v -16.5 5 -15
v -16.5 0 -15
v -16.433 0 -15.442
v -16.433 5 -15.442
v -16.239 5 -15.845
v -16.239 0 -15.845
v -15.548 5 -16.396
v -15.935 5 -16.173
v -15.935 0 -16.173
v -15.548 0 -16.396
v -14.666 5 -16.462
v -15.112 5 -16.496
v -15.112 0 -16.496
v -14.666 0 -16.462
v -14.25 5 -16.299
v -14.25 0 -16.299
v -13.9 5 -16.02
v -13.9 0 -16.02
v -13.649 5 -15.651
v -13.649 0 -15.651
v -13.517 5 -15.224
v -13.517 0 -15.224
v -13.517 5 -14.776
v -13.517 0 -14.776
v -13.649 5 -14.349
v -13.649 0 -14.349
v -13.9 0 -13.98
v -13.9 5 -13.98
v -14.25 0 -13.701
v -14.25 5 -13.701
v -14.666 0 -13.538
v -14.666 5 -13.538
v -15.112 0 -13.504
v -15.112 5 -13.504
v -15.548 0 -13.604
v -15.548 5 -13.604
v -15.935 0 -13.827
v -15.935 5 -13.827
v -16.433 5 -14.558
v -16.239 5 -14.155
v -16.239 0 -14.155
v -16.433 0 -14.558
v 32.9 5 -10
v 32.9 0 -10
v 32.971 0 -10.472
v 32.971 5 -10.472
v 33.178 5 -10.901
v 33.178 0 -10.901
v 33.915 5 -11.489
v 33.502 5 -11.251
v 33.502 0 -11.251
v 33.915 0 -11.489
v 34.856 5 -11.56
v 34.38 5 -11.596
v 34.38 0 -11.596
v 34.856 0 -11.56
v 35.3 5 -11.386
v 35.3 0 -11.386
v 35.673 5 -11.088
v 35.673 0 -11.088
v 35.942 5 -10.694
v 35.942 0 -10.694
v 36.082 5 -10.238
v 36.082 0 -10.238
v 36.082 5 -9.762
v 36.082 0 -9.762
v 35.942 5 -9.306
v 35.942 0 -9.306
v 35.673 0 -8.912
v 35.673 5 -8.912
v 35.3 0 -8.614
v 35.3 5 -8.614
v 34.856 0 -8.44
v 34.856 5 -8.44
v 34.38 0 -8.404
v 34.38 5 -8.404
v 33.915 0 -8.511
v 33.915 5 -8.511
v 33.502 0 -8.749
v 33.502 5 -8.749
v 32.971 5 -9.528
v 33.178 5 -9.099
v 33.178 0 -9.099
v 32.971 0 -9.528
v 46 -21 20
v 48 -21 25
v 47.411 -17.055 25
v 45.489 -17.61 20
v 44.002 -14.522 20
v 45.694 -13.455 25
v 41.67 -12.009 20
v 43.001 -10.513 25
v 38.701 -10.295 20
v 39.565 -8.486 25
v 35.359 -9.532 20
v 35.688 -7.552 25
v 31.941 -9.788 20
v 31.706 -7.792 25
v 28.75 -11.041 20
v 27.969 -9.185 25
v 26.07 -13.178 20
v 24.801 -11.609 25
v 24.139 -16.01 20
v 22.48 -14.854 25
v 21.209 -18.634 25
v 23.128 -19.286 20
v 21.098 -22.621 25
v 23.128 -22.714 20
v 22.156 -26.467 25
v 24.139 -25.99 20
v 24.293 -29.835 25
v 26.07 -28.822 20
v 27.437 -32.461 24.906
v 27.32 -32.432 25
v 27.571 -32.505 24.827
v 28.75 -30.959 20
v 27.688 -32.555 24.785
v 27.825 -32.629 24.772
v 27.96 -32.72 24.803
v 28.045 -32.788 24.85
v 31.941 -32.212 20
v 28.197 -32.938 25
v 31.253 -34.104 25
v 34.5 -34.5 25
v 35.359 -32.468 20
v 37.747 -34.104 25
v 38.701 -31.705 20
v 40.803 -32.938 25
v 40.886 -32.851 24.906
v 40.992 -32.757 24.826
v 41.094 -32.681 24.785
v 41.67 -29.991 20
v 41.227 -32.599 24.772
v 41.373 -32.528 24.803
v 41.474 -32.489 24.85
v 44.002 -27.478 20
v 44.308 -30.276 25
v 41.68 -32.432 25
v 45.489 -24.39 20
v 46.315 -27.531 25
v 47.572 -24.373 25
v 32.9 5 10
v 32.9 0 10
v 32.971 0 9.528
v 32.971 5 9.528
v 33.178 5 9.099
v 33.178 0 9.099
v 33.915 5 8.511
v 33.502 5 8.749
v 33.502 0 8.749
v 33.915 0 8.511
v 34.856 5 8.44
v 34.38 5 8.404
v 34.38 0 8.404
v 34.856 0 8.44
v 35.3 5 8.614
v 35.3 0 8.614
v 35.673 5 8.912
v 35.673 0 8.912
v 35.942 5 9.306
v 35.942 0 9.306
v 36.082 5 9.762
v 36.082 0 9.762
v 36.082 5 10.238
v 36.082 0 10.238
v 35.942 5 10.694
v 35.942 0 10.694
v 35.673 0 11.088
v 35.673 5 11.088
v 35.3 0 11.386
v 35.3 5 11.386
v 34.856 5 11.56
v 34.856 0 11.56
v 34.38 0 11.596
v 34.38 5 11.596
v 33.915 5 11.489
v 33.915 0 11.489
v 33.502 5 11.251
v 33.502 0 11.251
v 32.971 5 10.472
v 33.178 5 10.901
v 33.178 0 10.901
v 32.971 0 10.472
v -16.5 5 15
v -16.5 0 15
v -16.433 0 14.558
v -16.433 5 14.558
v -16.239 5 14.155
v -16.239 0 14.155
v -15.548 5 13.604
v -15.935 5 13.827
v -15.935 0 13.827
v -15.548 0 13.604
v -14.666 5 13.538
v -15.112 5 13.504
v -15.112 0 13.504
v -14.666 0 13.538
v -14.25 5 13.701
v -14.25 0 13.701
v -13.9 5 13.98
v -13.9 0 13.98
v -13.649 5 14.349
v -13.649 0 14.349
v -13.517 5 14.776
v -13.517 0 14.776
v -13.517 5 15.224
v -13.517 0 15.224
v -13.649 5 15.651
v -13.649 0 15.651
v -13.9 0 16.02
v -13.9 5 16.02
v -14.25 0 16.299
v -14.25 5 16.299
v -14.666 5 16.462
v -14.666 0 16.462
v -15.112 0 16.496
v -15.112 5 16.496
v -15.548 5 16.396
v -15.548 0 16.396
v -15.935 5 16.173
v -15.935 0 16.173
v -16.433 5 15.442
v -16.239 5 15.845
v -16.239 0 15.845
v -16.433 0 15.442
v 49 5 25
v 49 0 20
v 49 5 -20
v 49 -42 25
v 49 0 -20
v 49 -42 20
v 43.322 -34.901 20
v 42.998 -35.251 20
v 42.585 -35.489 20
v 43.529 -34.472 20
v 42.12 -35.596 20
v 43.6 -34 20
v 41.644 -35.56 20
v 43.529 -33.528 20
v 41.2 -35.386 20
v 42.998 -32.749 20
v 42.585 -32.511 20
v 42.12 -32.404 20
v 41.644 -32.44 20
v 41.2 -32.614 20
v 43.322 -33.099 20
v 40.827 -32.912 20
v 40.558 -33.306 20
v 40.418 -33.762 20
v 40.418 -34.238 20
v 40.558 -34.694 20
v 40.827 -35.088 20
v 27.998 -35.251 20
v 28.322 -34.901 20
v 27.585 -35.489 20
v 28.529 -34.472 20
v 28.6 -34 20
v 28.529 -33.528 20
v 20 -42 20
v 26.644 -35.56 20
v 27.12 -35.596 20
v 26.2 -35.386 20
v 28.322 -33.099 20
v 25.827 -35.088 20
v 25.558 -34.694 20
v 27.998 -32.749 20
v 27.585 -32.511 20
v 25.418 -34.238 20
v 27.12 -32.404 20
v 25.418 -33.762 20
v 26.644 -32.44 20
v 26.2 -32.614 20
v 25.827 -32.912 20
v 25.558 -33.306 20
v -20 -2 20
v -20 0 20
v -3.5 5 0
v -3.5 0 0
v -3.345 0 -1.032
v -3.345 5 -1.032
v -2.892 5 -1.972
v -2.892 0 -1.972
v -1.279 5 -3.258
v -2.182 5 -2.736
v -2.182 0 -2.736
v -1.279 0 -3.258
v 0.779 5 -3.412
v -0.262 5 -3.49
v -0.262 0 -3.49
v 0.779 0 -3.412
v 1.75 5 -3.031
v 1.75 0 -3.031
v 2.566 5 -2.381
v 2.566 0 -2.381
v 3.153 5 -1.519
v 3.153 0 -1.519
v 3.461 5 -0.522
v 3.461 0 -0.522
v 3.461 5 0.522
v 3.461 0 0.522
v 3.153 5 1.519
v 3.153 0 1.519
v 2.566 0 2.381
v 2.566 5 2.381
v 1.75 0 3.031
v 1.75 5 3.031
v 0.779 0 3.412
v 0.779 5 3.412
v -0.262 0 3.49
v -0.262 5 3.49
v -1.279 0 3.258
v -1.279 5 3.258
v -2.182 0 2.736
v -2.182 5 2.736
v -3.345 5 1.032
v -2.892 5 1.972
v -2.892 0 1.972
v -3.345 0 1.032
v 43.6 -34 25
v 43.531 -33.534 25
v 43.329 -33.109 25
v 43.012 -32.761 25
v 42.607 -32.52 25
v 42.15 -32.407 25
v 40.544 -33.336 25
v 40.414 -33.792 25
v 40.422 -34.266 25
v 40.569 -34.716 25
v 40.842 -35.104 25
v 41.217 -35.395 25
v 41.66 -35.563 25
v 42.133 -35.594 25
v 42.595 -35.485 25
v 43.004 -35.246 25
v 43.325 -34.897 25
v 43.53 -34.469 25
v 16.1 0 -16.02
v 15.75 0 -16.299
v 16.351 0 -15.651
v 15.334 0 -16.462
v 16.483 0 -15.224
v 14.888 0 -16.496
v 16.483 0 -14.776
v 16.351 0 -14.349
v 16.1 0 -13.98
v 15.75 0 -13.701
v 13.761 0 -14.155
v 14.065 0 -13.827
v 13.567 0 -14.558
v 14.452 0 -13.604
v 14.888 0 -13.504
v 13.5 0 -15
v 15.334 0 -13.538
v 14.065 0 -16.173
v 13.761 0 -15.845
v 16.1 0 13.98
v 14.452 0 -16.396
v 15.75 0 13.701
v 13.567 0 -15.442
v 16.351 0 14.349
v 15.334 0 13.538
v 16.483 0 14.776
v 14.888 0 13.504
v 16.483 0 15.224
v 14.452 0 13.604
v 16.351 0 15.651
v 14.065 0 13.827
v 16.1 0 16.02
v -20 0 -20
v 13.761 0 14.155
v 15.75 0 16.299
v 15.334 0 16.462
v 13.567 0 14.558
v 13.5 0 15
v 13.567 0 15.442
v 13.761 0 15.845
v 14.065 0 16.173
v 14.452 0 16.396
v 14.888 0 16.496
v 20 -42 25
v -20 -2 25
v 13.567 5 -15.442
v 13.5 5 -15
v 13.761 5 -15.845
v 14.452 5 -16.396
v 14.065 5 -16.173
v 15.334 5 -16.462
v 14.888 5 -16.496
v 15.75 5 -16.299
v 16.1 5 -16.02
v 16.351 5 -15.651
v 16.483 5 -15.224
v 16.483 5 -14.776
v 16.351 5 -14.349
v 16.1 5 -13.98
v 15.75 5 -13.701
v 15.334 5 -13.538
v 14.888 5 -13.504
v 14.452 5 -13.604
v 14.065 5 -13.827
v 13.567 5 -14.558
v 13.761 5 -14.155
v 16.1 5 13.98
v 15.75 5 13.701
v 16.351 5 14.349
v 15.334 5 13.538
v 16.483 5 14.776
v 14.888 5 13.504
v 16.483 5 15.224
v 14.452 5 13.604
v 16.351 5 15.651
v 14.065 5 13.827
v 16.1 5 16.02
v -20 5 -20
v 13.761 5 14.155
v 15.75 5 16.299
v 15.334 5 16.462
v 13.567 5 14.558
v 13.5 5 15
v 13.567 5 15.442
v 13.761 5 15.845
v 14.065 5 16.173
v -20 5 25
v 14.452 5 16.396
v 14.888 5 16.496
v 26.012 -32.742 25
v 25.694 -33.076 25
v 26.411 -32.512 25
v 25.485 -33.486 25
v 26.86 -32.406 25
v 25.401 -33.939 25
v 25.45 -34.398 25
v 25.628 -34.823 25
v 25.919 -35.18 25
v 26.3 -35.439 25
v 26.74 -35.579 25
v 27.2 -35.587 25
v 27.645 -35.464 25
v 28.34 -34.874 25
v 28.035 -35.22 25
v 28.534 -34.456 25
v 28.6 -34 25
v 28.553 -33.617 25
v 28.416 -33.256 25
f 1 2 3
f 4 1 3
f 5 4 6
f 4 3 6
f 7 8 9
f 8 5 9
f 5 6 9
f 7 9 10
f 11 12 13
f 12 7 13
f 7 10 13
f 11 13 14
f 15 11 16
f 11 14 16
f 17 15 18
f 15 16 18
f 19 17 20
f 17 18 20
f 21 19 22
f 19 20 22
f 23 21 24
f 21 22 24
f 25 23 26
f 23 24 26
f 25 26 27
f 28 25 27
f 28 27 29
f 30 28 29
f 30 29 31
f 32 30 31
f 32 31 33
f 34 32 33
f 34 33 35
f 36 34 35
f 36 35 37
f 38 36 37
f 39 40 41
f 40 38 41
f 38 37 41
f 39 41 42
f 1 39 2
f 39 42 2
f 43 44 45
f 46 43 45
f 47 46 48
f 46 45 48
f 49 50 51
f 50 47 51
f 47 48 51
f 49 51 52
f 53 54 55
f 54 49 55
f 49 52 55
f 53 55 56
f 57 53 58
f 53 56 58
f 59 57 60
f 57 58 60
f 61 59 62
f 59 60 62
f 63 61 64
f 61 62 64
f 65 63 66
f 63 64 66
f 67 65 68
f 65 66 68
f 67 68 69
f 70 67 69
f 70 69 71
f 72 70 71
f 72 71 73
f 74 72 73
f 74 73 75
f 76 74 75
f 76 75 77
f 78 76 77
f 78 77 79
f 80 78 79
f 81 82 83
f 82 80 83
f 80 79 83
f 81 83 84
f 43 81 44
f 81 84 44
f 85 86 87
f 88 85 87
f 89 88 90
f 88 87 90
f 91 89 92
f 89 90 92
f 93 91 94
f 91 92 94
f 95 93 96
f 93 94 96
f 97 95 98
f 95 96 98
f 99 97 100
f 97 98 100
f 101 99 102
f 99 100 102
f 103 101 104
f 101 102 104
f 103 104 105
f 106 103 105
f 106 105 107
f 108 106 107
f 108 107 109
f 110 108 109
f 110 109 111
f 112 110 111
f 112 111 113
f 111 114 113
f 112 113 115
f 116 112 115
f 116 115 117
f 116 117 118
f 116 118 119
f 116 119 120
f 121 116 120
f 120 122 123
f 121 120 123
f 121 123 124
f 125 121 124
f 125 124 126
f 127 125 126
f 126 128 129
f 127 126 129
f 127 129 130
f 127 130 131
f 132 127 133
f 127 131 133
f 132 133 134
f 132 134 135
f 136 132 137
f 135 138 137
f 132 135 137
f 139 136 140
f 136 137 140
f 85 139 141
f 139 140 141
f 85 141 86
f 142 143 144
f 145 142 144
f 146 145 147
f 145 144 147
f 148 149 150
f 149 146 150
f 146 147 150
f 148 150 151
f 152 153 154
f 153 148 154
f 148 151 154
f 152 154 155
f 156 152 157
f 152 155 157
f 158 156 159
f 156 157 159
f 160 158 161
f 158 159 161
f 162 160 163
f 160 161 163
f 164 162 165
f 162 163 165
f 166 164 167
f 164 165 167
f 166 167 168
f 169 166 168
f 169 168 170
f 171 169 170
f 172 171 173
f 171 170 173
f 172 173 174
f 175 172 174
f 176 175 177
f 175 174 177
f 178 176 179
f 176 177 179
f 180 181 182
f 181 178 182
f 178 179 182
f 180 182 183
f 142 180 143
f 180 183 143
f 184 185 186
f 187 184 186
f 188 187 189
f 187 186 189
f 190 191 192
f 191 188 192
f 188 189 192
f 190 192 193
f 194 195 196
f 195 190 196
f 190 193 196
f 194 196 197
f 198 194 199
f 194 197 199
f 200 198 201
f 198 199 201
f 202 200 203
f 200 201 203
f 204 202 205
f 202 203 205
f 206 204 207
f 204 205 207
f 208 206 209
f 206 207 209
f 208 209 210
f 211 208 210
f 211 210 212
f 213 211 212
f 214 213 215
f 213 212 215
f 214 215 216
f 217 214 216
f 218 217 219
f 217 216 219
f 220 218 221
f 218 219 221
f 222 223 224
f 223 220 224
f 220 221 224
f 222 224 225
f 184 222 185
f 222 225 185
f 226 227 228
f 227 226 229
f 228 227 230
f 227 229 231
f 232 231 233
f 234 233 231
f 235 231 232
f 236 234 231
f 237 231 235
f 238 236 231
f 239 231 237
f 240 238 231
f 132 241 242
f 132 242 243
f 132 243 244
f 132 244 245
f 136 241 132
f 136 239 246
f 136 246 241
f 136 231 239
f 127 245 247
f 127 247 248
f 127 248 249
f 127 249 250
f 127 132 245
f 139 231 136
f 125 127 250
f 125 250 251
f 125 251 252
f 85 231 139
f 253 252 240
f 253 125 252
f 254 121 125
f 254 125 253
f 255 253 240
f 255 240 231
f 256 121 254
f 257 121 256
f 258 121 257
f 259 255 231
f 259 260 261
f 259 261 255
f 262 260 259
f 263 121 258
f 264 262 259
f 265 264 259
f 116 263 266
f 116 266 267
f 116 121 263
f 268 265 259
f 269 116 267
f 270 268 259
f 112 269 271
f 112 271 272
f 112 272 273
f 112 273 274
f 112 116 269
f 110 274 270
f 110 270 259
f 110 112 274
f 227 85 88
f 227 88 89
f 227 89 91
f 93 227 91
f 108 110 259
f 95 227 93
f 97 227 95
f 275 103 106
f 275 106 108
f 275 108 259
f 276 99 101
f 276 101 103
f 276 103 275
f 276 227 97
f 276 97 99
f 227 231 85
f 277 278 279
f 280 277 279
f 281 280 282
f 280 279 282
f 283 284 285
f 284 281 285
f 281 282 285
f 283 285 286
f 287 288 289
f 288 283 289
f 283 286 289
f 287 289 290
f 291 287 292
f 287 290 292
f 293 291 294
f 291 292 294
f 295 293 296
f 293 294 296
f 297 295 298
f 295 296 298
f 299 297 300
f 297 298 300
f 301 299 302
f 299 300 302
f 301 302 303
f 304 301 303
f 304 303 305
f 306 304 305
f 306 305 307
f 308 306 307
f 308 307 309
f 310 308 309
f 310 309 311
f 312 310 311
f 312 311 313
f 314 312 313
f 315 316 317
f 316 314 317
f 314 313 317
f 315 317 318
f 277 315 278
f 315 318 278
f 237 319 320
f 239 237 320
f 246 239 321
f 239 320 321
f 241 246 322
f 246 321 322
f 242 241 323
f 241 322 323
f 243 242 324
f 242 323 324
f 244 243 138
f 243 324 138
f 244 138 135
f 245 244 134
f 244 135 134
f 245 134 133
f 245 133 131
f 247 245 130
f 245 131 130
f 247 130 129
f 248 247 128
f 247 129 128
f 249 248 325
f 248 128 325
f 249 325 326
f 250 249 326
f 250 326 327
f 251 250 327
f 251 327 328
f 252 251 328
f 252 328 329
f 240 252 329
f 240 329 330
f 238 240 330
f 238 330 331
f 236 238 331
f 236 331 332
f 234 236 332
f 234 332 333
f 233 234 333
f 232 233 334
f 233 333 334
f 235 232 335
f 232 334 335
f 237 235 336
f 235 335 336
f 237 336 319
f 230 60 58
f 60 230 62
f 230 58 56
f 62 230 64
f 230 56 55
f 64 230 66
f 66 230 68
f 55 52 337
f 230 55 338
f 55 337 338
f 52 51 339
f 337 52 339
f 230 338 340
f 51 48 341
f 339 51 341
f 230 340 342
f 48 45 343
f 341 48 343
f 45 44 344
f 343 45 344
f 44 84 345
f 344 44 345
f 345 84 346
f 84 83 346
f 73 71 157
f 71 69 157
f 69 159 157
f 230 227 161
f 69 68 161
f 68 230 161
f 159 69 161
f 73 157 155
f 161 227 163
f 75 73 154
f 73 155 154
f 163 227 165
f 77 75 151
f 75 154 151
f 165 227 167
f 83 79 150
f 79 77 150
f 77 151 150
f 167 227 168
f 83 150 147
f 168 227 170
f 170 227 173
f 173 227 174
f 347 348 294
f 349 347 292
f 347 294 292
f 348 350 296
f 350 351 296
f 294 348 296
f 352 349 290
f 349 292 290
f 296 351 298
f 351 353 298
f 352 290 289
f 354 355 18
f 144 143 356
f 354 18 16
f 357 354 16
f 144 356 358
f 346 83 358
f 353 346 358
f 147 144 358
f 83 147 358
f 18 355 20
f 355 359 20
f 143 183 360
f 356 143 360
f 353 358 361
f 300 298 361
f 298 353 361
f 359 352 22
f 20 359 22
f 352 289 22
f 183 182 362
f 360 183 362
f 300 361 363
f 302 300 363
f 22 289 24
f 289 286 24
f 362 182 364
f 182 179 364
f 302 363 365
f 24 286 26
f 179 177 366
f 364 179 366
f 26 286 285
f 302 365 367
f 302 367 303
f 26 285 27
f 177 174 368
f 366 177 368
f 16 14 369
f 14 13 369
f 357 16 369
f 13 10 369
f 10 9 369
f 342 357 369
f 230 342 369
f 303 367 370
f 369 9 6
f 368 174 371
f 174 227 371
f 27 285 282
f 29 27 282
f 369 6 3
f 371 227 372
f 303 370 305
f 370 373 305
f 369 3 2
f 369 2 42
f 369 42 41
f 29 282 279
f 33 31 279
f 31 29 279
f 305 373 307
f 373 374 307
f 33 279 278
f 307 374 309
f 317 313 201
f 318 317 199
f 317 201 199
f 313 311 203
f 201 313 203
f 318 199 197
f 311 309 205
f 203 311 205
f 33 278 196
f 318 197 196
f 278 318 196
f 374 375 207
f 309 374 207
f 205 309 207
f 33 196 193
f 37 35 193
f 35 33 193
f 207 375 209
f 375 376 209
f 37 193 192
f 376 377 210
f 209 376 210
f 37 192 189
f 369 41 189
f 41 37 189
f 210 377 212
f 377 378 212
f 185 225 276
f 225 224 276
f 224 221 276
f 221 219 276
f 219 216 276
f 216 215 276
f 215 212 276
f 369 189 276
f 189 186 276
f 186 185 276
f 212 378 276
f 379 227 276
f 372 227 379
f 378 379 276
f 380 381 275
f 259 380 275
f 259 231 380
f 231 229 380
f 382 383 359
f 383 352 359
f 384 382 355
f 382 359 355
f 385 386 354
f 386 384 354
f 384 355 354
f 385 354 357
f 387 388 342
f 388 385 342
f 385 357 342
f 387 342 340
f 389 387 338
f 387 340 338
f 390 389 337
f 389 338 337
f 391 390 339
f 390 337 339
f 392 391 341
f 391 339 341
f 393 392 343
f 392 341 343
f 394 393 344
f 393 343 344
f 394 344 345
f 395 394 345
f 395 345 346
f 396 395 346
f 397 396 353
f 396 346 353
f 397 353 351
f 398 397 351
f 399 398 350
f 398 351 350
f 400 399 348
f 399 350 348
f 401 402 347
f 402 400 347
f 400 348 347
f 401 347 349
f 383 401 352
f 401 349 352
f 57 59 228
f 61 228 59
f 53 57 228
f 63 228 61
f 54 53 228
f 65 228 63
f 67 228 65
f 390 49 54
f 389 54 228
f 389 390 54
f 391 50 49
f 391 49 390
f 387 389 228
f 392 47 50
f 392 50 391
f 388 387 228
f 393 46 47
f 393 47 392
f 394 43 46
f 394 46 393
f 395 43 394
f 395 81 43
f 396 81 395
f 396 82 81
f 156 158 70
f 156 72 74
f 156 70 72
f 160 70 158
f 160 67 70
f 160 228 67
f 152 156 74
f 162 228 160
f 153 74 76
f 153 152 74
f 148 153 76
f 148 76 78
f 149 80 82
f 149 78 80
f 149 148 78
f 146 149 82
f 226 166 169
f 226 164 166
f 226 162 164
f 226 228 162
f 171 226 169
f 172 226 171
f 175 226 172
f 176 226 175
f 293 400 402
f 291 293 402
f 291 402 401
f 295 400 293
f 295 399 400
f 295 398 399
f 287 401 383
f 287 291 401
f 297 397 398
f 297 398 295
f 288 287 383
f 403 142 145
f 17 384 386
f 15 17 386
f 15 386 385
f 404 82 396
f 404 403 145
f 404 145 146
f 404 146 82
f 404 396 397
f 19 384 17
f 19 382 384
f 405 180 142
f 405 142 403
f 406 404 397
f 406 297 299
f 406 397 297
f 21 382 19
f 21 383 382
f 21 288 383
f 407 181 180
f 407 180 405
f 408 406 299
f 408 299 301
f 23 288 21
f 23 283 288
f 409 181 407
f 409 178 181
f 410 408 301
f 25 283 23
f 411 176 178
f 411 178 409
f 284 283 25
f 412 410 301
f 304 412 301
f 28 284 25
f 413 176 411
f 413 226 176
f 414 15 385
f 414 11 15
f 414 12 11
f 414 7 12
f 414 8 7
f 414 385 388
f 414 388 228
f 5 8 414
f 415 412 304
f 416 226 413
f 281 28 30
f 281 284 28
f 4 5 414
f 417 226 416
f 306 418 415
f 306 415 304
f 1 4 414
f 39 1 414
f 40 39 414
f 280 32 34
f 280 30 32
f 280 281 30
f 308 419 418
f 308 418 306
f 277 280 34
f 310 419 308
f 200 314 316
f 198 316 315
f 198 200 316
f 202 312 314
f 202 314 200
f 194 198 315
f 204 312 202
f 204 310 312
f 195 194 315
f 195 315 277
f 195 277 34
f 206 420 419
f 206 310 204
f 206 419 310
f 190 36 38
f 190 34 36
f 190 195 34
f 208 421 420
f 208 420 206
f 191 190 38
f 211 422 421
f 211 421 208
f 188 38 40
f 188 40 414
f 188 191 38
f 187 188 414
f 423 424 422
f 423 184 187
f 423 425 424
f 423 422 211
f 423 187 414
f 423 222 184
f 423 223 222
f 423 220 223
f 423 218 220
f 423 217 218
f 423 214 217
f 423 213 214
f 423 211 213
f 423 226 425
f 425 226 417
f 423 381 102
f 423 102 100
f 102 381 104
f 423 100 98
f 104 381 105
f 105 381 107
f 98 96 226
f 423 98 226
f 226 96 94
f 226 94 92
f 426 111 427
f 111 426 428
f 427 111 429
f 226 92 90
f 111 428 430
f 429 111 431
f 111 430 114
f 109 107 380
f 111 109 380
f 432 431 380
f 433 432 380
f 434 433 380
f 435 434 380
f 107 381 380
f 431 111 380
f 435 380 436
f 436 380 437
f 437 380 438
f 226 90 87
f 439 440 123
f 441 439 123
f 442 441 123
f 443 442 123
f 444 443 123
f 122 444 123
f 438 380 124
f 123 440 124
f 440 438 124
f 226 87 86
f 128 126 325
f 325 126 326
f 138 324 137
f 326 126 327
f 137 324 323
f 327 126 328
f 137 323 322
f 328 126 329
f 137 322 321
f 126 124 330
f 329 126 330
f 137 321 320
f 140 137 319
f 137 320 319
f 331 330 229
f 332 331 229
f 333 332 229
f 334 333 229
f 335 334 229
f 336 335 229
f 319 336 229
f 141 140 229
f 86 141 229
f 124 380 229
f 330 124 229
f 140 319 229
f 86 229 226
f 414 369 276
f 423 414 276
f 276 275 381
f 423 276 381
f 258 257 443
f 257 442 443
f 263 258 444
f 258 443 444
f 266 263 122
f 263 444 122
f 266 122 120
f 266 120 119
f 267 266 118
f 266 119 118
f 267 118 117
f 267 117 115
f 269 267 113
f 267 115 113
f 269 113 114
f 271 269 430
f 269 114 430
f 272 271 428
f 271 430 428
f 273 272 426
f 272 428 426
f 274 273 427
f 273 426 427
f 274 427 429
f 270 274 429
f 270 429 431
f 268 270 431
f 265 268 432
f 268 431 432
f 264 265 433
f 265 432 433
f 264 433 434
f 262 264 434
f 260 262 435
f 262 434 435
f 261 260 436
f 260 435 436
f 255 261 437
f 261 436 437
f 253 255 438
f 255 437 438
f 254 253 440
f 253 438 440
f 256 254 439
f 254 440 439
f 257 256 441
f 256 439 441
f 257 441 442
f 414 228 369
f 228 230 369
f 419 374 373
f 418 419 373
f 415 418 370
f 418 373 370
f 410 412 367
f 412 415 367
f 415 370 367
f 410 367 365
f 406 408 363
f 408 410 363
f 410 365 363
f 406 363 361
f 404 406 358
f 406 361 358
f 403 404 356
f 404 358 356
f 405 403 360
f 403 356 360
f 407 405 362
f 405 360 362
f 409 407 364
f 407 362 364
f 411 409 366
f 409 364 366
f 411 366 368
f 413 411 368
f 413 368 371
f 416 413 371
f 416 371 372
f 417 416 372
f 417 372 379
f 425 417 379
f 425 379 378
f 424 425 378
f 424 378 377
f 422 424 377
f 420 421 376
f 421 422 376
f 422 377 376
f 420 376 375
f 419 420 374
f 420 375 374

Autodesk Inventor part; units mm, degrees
ref_plane "YZ Plane" through (0, 0, 0) normal (1, 0, 0) x (0, 1, 0)
ref_plane "XZ Plane" through (0, 0, 0) normal (0, 1, 0) x (-1, 0, 0)
ref_plane "XY Plane" through (0, 0, 0) normal (0, 0, 1) x (1, 0, 0)
sketch "Sketch1" plane through (0, 0, 0) normal (0, 1, 0) x (-1, 0, 0)
  line L0 (-20, 20) -> (20, 20)
  line L1 (20, 20) -> (20, -20)
  line L2 (20, -20) -> (-20, -20)
  line L3 (-20, -20) -> (-20, 20)
  line L4 (-20, 20) -> (20, -20) construction
  line L5 (20, 20) -> (-20, -20) construction
  circle A0 centre (15, -15) radius 1.5
  circle A1 centre (-15, -15) radius 1.5
  circle A2 centre (-15, 15) radius 1.5
  circle A3 centre (15, 15) radius 1.5
  line L6 (15, 15) -> (15, -15) construction
  line L7 (-15, -15) -> (15, -15) construction
  line L8 (-15, -15) -> (-15, 15) construction
  line L9 (-20, 20) -> (-49, 20)
  line L10 (-49, 20) -> (-49, -20)
  line L11 (-49, -20) -> (-20, -20)
  circle A4 centre (0, 0) radius 3.5
  line L12 (20, 20) -> (20, 25)
  line L13 (20, 25) -> (-49, 25)
  line L14 (-49, 25) -> (-49, 20)
  line L15 (-34.5, -20) -> (-34.5, -10) construction
  line L16 (-34.5, -10) -> (-34.5, 10) construction
  circle A5 centre (-34.5, -10) radius 1.6
  circle A6 centre (-34.5, 10) radius 1.6
  dimension "d0" = 40
  dimension "d1" = 40
  dimension "d2" = 30
  dimension "d3" = 3
  dimension "d26" = 7
  dimension "d27" = 29
  dimension "d29" = 5
  dimension "d40" = 10
  dimension "d41" = 20
  dimension "d42" = 3.2
sketch "Sketch1 outline for Extrusion1" plane through (0, 0, 0) normal (0, 1, 0) x (-1, 0, 0)
  line L0 (-49, 25) -> (-49, -20)
  line L1 (-49, -20) -> (20, -20)
  line L2 (20, -20) -> (20, 25)
  line L3 (20, 25) -> (-49, 25)
  circle A0 centre (15, 15) radius 1.5
  circle A1 centre (0, 0) radius 3.5
  circle A2 centre (-34.5, -10) radius 1.6
  circle A3 centre (-15, -15) radius 1.5
  circle A4 centre (15, -15) radius 1.5
  circle A5 centre (-34.5, 10) radius 1.6
  circle A6 centre (-15, 15) radius 1.5
extrude "Extrusion1" add sketch "Sketch1 outline for Extrusion1" along normal blind 5
sketch "Sketch1 outline for Extrusion4" plane through (0, 0, 0) normal (0, 1, 0) x (-1, 0, 0)
  line L0 (-49, 25) -> (-49, 20)
  line L1 (20, 25) -> (-49, 25)
  line L2 (20, 20) -> (20, 25)
  line L3 (-20, 20) -> (20, 20)
  line L4 (-49, 20) -> (-20, 20)
extrude "Extrusion4" add sketch "Sketch1 outline for Extrusion4" against normal blind 42
sketch "Sketch2" plane through (-20, 5, 25) normal (0, 0, 1) x (1, 0, 0)
  line L0 (69, -47) -> (69, 0)
  line L1 (0, 0) -> (69, 0)
  line L2 (0, -47) -> (0, 0)
  line L3 (69, -47) -> (0, -47)
  line L4 (69, -47) -> (40, -47)
  line L5 (40, -47) -> (40, 0)
  line L6 (40, 0) -> (69, 0)
  line L7 (69, 0) -> (69, -47)
  circle A0 centre (54.5, -26) radius 11.5
  line L8 (54.5, -26) -> (54.5, -47) construction
  line L9 (69, -47) -> (0, -47)
  line L10 (43, -32.639528) -> (43, -19.360472)
  line L11 (43, -19.360472) -> (54.5, -12.720944)
  line L12 (54.5, -12.720944) -> (66, -19.360472)
  line L13 (66, -19.360472) -> (66, -32.639528)
  line L14 (66, -32.639528) -> (54.5, -39.279056)
  line L15 (54.5, -39.279056) -> (43, -32.639528)
  line L16 (54.5, -39) -> (62, -39) construction
  line L17 (54.5, -39) -> (47, -39) construction
  circle A1 centre (62, -39) radius 1.6
  circle A2 centre (47, -39) radius 1.6
  point P0 (20, -5)
  point P1 (54.5, -26)
  point P2 (48.75, -35.959292)
  point P3 (60.25, -35.959292)
  point P4 (43, -26)
  point P5 (66, -26)
  point P6 (60.25, -16.040708)
  point P7 (48.75, -16.040708)
  dimension "d32" = 29
  dimension "d33" = 21
  dimension "d34" = 23
  dimension "d37" = 3.2
  dimension "d39" = 8
  dimension "d46" = 15
sketch "Sketch2 outline for Extrusion5" plane through (-20, 5, 25) normal (0, 0, 1) x (1, 0, 0)
  circle A0 centre (62, -39) radius 1.6
  circle A1 centre (47, -39) radius 1.6
  circle A2 centre (54.5, -26) radius 11.5
extrude "Extrusion5" cut sketch "Sketch2 outline for Extrusion5" against normal up to surface (5 mm away)
chamfer "Chamfer4" distance 40 angle 45 1 edges at (-20, -42, 22.5)
chamfer "Chamfer5" distance 2 distance2 5 1 edges at (23, -21, 25)
sketch "Sketch3" plane through (0, 5, 0) normal (0, 1, 0) x (1, 0, 0)
  point P0 (0, 0)
properties part number "Tensioner Top_3DPrint"
